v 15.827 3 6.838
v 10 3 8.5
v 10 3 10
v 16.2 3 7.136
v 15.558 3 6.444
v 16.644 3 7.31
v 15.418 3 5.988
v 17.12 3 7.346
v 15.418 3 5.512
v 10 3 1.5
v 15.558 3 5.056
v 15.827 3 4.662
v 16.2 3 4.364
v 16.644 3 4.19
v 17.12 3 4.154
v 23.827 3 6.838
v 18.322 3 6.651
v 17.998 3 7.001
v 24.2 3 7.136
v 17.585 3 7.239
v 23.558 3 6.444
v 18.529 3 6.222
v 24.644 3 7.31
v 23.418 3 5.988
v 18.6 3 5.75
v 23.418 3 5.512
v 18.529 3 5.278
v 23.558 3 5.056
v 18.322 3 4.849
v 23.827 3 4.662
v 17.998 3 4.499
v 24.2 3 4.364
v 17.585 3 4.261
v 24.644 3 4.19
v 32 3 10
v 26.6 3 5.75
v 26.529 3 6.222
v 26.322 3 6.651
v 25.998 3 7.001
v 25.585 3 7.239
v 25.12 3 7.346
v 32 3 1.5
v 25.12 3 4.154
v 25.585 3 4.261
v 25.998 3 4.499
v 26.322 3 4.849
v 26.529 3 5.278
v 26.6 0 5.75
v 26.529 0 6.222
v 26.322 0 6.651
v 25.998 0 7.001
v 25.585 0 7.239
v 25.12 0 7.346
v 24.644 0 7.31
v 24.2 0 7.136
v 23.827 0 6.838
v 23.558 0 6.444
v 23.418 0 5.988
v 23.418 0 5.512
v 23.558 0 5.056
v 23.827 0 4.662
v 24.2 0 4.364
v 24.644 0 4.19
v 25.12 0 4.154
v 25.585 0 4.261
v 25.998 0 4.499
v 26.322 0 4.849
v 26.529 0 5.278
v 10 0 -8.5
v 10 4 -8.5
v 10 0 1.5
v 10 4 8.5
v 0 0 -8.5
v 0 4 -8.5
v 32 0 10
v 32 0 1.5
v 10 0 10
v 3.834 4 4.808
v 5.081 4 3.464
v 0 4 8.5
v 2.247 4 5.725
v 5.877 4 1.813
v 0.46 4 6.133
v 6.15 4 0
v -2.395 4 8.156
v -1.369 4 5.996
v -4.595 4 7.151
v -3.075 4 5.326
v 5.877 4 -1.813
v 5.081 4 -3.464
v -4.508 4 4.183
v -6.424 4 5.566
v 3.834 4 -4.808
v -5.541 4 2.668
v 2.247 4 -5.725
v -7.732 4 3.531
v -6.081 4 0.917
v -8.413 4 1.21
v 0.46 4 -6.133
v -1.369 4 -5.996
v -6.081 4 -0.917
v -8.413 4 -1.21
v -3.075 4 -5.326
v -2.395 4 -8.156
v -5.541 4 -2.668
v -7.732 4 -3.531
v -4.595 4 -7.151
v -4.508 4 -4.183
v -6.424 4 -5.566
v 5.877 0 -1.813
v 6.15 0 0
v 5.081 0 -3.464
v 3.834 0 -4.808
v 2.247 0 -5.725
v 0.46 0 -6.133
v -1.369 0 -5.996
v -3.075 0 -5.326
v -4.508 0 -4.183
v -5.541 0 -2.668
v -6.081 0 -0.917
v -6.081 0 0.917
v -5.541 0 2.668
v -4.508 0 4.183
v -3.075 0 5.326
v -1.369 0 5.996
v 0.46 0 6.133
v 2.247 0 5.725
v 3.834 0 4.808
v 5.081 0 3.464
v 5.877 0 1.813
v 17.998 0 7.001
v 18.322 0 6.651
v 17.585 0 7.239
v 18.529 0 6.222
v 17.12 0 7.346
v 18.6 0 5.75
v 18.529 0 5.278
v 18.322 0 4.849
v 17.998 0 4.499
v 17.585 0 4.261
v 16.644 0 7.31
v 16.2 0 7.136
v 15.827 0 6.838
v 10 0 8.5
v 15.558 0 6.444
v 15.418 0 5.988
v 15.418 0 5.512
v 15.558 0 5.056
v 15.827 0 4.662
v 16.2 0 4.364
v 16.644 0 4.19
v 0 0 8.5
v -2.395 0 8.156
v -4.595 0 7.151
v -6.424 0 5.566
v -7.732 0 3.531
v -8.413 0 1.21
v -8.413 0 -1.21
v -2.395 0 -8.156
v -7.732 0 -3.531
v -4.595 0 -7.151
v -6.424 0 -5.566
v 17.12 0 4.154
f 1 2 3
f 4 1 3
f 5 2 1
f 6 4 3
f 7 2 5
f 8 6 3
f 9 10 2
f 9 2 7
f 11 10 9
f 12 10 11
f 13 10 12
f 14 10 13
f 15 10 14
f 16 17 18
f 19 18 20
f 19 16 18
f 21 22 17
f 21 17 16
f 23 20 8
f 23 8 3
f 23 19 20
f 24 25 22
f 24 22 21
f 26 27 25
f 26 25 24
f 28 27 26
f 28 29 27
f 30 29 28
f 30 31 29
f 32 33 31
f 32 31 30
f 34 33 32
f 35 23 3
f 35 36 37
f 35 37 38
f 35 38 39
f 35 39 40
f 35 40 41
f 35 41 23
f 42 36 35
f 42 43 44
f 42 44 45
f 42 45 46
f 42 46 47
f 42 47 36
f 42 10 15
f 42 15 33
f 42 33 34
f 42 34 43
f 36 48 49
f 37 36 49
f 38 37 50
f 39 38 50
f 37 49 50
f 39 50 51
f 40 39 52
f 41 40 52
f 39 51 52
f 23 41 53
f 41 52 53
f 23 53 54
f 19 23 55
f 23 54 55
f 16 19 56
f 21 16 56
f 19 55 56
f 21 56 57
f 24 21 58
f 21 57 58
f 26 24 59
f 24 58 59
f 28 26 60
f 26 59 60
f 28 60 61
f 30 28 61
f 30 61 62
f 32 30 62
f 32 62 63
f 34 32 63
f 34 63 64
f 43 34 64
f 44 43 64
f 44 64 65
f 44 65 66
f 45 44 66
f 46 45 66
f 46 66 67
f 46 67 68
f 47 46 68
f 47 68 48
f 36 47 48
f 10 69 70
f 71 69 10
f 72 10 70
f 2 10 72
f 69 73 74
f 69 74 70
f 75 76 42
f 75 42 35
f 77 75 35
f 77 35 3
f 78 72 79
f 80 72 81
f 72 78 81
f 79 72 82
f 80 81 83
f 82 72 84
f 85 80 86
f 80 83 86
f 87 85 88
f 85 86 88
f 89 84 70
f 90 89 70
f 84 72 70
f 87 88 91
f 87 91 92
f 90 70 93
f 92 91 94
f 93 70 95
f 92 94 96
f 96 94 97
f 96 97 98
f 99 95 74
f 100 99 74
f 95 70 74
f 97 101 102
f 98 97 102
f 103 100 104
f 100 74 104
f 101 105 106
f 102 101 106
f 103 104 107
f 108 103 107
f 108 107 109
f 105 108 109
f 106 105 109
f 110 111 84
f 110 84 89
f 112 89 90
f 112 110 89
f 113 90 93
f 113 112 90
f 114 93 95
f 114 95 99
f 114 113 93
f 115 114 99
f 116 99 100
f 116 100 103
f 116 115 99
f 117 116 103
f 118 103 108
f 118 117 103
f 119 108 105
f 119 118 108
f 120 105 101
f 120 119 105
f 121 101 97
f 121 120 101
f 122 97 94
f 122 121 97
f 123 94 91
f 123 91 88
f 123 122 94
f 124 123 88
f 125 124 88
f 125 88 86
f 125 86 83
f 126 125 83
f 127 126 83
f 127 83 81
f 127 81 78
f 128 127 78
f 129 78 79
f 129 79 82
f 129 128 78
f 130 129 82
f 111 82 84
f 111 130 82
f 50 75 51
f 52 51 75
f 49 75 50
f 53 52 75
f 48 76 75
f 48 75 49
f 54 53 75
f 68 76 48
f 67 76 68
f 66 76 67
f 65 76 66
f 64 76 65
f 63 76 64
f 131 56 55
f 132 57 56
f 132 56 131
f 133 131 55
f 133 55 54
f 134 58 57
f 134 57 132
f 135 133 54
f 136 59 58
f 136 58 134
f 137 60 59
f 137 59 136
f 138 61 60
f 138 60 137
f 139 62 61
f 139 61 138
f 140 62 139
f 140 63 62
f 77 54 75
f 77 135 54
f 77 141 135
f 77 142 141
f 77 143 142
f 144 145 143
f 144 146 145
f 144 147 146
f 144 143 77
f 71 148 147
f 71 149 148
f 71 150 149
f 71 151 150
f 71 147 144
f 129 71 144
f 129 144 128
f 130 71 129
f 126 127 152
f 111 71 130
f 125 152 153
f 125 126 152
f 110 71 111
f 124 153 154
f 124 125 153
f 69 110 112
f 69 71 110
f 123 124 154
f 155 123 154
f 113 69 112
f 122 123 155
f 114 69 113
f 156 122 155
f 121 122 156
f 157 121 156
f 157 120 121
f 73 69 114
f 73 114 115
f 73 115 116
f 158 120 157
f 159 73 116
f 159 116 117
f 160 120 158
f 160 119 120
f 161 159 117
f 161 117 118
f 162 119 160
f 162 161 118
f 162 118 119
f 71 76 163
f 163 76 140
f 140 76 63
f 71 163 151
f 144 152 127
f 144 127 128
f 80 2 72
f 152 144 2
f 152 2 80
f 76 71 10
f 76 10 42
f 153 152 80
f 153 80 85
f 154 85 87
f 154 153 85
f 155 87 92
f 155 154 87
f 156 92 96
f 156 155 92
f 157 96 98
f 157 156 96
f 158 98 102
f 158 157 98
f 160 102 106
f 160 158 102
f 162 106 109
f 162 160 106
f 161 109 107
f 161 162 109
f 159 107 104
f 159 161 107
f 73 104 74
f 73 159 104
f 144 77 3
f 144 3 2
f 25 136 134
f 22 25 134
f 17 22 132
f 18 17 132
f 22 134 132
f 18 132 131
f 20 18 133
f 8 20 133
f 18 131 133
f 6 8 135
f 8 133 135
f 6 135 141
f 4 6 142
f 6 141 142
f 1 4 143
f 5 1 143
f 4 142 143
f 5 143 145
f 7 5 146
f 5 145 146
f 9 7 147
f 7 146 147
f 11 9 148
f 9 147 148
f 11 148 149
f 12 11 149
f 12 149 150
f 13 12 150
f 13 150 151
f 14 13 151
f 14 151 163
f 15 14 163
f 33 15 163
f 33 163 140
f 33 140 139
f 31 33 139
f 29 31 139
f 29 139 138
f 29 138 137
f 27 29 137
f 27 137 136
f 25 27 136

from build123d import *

# Parameters (mm, degrees)
SKETCH1_R           = 6.15
BOSS_EXTRUDE2_DEPTH = 4
SKETCH4_W           = 22
SKETCH4_H           = 8.5
CUT_EXTRUDE2_DEPTH  = 1
SKETCH5_R           = 1.6
CUT_EXTRUDE3_DEPTH  = 5


with BuildPart() as part:
    # Sketch1 → Boss-Extrude2 (new body)
    with BuildSketch(Plane(origin=(0, 0, 0), x_dir=(1, 0, 0), z_dir=(0, 1, 0))):
        with BuildLine():
            Line((10, -1.5), (32, -1.5))
            Line((32, -1.5), (32, -8.5))
            Line((32, -8.5), (32, -10))
            Line((32, -10), (10, -10))
            Line((10, -10), (10, -8.5))
            Line((10, -8.5), (0, -8.5))
            ThreePointArc((0, -8.5), (-8.5, 0), (0, 8.5))
            Line((0, 8.5), (10, 8.5))
            Line((10, 8.5), (10, -1.5))
        make_face()
        Circle(SKETCH1_R, mode=Mode.SUBTRACT)
    extrude(amount=BOSS_EXTRUDE2_DEPTH)

    # Sketch4 → Cut-Extrude2 (cut)
    with BuildSketch(Plane(origin=(0, 4, 0), x_dir=(1, 0, 0), z_dir=(0, 1, 0))):
        with Locations((21, -5.75)):
            Rectangle(SKETCH4_W, SKETCH4_H)
    extrude(amount=-CUT_EXTRUDE2_DEPTH, mode=Mode.SUBTRACT)

    # Sketch5 → Cut-Extrude3 (cut, through all)
    with BuildSketch(Plane.XZ):
        with Locations((17, 5.75)):
            Circle(SKETCH5_R)
        with Locations((25, 5.75)):
            Circle(SKETCH5_R)
    extrude(amount=-CUT_EXTRUDE3_DEPTH, mode=Mode.SUBTRACT)


solid = part.part
